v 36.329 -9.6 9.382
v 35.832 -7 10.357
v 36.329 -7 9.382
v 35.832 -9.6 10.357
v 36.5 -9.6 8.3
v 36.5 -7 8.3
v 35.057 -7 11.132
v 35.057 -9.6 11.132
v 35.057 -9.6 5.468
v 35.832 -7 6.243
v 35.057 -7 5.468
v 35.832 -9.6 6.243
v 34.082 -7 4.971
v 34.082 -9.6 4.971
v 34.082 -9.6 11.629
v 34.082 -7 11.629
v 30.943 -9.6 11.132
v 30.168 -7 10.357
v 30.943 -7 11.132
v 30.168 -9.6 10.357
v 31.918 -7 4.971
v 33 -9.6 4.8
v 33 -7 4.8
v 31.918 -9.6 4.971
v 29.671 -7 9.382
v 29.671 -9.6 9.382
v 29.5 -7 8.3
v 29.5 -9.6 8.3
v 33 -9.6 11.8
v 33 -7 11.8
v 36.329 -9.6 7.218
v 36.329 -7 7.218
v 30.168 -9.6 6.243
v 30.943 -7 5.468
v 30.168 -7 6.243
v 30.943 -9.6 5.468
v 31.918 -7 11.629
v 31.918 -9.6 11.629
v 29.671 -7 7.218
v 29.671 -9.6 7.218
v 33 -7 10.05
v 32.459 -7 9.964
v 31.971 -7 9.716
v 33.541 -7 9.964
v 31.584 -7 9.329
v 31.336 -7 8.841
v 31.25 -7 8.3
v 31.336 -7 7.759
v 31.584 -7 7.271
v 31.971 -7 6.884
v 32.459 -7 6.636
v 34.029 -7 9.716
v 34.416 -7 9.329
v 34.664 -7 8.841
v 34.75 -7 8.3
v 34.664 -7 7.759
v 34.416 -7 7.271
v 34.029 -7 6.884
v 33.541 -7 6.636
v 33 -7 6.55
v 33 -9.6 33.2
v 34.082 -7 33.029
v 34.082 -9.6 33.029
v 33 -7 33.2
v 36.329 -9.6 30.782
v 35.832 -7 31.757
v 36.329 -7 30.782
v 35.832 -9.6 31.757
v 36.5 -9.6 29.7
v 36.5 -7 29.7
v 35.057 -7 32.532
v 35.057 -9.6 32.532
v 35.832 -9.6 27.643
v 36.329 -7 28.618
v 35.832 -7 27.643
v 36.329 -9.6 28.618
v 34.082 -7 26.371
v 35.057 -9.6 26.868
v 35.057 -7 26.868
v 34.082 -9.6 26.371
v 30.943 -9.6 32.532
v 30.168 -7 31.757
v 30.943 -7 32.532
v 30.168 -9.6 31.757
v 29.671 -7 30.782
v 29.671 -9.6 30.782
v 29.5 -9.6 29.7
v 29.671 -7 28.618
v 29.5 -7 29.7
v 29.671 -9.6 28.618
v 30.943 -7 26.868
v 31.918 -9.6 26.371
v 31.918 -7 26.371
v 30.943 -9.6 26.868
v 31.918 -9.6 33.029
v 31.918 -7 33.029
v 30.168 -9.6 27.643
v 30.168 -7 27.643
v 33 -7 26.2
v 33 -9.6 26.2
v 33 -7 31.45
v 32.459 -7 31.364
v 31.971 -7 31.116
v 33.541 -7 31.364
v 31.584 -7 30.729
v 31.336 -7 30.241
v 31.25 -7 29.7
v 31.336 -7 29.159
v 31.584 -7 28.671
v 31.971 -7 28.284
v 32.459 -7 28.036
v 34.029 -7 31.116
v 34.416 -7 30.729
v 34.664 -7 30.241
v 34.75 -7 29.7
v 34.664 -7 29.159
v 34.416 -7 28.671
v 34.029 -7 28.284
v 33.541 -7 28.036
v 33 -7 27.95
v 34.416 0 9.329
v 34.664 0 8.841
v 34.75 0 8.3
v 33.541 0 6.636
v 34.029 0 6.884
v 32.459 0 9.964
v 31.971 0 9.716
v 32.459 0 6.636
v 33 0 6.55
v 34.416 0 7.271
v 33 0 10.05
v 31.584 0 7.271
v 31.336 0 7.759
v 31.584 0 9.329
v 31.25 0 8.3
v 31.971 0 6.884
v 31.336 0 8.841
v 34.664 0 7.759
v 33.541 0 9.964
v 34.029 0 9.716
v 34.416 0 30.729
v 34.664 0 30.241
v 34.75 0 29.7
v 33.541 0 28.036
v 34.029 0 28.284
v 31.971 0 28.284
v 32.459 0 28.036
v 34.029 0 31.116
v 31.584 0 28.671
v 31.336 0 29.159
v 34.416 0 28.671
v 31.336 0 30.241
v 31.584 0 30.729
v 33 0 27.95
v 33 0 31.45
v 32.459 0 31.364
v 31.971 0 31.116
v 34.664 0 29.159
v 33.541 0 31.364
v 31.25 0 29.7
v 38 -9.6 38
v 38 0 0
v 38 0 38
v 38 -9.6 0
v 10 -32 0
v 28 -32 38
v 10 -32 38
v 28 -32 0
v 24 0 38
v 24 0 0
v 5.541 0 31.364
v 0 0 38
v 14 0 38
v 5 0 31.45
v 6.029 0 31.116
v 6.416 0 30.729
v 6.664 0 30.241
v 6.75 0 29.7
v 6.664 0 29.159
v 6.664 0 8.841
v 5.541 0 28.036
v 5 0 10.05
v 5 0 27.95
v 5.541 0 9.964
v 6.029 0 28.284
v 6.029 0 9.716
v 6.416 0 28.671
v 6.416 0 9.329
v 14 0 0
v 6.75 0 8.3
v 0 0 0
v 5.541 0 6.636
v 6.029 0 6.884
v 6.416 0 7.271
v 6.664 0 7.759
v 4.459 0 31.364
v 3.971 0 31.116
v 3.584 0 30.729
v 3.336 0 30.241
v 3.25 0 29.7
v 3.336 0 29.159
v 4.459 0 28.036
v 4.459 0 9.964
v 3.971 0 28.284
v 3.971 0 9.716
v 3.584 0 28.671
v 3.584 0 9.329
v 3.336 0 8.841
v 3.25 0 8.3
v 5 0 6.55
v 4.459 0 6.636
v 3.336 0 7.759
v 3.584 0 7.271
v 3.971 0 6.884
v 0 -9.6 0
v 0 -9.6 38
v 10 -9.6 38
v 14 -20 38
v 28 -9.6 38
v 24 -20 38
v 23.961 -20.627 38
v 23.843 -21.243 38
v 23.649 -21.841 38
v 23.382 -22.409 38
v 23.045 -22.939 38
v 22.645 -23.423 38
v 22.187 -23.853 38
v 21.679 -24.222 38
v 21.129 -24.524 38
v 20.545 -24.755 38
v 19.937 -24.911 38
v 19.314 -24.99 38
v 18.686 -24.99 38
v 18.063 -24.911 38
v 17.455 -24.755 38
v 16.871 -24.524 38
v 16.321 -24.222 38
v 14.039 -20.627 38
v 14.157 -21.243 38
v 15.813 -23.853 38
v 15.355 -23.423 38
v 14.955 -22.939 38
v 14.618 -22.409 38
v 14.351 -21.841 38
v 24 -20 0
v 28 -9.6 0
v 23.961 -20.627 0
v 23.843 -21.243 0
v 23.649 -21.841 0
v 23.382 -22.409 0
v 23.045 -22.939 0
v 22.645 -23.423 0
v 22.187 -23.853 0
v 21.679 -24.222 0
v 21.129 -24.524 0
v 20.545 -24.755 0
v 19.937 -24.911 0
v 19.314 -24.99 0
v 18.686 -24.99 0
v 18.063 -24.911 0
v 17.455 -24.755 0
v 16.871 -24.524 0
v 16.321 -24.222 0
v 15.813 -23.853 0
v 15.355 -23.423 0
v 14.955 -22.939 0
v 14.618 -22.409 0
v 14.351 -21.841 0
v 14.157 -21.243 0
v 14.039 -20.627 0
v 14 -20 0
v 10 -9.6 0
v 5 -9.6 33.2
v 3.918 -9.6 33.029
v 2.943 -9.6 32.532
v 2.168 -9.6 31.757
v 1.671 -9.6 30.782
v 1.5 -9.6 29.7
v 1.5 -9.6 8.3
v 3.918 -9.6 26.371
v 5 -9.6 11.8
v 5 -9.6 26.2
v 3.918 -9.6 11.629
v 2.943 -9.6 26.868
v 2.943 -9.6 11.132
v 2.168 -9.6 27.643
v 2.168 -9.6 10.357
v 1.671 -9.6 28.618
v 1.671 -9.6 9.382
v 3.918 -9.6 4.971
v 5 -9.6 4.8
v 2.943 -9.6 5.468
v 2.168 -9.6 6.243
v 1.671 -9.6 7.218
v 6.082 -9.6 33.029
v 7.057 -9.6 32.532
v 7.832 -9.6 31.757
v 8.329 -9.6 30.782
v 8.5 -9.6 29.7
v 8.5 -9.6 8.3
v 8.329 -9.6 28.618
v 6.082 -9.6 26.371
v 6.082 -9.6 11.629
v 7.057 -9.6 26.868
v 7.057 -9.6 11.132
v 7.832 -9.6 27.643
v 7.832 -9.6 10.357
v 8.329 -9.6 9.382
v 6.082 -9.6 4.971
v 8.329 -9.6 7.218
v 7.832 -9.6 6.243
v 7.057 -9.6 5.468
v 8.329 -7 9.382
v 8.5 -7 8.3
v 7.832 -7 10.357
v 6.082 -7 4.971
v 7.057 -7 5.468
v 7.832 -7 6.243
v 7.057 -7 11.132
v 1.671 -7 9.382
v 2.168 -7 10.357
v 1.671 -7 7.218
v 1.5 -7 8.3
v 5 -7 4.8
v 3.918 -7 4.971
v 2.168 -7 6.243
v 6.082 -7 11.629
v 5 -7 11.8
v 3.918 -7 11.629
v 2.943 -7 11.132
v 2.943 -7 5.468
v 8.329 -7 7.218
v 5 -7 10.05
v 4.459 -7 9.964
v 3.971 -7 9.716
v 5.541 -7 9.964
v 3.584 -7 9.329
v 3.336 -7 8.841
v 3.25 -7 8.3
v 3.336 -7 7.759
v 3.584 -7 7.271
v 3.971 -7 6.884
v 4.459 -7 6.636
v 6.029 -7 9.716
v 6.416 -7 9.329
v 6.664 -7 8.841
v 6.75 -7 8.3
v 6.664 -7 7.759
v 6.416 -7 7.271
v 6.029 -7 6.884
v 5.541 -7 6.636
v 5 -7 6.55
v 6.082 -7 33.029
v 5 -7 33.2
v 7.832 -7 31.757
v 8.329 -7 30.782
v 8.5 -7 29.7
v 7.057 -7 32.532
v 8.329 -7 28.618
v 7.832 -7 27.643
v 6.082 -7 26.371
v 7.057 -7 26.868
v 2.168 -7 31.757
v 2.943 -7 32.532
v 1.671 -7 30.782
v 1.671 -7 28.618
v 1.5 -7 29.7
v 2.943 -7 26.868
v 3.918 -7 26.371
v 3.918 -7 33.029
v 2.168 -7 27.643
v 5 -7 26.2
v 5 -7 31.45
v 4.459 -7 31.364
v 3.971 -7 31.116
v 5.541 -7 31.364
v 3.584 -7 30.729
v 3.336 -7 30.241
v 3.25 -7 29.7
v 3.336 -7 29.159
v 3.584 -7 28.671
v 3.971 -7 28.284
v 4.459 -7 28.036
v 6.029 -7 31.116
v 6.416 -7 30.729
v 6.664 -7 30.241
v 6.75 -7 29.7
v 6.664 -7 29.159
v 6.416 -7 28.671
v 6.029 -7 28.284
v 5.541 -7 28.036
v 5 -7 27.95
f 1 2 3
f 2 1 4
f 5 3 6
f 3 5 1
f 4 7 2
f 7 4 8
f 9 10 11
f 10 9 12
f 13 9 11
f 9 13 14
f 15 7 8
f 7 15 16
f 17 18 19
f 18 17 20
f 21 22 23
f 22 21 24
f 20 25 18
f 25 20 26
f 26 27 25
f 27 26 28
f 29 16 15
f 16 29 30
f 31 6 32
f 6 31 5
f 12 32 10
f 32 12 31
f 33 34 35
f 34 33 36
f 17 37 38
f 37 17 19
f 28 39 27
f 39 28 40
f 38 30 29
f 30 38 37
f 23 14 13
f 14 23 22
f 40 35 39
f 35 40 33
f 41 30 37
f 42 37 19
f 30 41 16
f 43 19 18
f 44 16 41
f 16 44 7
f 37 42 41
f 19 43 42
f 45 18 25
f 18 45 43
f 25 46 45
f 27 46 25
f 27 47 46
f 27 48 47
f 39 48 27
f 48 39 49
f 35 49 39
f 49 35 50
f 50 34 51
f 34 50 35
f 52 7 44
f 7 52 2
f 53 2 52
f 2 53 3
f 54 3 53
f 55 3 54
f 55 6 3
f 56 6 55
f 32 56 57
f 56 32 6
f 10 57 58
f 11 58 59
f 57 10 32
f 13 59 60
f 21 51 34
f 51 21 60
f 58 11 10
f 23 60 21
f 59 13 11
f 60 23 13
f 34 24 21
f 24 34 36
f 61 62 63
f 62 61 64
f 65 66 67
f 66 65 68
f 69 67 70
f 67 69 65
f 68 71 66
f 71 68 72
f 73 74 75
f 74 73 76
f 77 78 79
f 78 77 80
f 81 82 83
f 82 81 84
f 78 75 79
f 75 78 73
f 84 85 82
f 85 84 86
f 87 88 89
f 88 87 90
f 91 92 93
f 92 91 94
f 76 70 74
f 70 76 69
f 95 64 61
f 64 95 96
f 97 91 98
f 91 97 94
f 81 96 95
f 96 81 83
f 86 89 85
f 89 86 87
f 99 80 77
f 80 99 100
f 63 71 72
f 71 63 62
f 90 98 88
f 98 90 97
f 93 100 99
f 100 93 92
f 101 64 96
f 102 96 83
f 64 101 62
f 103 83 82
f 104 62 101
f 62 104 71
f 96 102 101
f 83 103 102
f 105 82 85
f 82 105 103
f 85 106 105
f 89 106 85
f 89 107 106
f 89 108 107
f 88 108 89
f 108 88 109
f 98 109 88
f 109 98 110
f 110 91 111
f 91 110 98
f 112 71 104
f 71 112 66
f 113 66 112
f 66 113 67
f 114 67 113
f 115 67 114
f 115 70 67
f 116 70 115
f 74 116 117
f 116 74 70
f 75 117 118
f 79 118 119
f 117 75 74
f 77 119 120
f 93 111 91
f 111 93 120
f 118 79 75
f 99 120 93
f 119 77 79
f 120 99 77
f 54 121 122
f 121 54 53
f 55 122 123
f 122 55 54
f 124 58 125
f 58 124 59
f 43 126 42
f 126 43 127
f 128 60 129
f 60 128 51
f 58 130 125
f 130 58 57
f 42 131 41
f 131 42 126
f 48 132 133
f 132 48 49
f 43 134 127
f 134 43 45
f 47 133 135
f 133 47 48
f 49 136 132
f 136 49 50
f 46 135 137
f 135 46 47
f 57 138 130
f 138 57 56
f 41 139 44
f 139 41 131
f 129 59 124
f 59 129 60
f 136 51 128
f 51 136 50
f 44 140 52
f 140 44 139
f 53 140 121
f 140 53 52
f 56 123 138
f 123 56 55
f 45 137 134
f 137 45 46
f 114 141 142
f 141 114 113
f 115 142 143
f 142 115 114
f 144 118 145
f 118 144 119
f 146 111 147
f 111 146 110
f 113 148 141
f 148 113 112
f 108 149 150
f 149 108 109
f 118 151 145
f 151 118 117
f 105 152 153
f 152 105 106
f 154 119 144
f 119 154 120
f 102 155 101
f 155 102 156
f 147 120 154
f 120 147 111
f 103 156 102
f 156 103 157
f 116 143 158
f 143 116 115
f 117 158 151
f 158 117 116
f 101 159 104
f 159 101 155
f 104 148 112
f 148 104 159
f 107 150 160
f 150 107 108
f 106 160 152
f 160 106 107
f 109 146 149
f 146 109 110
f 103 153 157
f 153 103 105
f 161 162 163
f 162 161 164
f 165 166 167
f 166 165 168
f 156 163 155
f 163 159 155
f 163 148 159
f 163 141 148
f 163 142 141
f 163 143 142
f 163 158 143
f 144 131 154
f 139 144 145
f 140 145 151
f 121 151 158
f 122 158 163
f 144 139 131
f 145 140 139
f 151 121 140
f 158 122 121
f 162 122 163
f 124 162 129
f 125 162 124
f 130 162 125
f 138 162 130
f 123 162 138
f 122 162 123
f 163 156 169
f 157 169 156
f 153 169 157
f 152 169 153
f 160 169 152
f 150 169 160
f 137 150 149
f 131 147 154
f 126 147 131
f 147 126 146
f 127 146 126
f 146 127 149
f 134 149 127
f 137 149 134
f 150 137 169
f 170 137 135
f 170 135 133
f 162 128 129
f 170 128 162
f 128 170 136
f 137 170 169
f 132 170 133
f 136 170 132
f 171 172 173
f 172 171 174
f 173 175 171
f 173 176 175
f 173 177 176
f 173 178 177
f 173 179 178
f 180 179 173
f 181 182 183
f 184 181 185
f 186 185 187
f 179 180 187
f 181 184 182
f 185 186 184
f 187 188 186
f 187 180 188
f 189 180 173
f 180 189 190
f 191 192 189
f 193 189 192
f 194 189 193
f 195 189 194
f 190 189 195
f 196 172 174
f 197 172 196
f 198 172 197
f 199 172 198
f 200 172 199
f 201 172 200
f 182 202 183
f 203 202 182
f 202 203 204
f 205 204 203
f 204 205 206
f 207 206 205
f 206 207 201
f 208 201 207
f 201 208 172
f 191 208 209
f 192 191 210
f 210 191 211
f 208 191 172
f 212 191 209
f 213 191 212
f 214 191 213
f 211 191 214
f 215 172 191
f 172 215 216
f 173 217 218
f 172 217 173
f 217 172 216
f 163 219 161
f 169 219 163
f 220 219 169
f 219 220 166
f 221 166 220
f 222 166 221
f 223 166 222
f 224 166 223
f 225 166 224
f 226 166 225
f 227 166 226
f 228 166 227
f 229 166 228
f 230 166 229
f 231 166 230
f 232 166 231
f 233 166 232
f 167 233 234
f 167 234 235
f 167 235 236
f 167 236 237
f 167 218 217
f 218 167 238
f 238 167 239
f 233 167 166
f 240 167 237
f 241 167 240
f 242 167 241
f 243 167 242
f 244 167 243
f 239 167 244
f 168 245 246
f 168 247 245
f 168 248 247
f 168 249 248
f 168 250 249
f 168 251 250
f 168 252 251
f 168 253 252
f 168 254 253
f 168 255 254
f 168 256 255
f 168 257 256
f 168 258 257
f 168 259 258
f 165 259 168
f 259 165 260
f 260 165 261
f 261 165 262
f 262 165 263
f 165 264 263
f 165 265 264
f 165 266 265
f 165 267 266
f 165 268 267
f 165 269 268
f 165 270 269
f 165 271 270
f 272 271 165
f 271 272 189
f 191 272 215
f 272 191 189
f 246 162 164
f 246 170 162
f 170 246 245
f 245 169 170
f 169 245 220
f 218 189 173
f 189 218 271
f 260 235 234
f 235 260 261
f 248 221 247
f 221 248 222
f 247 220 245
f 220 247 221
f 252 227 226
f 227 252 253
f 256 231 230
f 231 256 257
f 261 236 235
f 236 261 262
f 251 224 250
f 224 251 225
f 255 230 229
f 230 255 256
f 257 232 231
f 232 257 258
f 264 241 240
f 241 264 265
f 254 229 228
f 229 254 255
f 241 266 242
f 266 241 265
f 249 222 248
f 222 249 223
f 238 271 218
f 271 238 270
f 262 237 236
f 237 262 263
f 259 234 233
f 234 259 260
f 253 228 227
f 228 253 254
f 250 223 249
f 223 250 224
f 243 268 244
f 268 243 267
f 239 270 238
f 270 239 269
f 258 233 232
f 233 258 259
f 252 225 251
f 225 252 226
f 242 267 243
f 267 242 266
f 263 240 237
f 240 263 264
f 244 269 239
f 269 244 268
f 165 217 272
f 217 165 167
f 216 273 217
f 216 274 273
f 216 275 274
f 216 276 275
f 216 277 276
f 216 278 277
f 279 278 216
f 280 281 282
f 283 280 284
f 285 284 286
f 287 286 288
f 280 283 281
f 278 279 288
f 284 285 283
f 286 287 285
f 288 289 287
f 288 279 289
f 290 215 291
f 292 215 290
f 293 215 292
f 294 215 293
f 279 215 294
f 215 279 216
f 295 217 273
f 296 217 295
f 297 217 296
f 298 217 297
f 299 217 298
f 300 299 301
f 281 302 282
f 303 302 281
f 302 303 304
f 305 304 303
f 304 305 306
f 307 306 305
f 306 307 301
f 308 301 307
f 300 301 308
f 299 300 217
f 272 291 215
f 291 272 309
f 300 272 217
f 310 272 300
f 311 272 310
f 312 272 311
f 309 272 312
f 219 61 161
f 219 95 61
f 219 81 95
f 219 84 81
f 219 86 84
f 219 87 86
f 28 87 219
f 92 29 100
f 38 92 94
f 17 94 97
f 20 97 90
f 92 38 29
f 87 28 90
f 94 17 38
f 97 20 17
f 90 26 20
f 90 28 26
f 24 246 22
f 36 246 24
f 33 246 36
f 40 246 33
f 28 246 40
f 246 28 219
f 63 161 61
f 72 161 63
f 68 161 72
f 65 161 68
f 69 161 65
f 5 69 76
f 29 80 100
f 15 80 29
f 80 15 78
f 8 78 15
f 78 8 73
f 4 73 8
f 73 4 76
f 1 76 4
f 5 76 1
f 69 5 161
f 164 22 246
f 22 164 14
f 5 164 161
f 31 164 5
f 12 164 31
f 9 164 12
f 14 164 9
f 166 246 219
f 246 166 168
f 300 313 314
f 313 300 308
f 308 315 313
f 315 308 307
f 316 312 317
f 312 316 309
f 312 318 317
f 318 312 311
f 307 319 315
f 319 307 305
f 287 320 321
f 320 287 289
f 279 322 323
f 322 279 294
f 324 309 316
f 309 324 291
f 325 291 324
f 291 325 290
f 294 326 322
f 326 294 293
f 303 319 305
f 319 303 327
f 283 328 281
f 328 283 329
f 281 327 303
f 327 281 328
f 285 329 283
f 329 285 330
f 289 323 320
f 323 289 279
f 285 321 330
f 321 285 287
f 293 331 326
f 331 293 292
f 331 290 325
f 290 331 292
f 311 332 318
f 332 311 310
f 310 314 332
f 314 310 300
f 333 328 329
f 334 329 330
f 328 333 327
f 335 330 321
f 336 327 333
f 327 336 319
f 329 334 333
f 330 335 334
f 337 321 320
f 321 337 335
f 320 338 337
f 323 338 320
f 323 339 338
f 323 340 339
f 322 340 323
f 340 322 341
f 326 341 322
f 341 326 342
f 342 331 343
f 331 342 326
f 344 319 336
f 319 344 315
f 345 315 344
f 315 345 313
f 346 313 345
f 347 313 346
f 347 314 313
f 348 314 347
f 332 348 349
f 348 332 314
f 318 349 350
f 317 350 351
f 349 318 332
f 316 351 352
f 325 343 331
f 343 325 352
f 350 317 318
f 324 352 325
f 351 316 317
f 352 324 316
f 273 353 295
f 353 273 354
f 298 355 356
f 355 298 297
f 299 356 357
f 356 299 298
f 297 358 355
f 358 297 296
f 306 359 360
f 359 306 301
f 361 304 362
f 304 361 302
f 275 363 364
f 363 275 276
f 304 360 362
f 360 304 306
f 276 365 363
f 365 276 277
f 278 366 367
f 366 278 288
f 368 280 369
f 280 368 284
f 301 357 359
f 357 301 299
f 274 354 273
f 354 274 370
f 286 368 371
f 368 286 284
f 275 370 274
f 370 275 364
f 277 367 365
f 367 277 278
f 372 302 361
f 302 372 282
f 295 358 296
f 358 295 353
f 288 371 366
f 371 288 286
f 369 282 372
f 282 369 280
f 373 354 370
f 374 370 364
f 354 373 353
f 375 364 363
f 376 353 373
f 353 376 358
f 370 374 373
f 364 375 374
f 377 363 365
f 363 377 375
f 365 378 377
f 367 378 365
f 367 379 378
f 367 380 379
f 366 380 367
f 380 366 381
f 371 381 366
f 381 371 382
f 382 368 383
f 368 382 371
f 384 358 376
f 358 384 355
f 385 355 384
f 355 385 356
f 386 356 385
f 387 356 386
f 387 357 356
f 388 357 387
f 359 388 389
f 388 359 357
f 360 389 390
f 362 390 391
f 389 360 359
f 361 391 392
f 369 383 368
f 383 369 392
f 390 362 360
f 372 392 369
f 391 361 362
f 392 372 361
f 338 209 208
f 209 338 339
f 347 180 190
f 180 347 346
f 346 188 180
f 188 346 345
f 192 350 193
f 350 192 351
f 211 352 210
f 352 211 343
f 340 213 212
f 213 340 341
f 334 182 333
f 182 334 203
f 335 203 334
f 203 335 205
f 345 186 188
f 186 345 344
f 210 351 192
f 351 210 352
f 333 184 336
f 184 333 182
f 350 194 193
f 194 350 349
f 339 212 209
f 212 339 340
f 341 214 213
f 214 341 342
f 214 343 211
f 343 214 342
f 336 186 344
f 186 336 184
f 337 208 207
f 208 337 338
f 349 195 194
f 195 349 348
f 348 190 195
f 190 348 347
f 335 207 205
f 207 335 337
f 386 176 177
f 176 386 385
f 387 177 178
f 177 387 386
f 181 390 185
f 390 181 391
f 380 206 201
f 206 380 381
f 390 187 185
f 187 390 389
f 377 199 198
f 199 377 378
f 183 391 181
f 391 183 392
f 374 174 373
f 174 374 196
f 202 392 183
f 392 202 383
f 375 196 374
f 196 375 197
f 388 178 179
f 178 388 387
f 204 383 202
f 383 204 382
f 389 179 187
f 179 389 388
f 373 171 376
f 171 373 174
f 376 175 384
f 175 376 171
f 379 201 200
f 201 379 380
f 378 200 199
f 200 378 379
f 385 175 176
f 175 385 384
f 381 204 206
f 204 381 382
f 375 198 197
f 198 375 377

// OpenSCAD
rotate([90, 0, 0]){
	difference(){ 
		cube([38, 38, 32]);

		// Out cut
		translate([14, -1, -1]) cube([10, 40, 21]);
		translate([19, 39, 20]) rotate([90, 0, 0]) cylinder(h = 40, d = 10, $fn = 50);
		translate([-1, -1, 9.6]) cube([11, 40, 35]);
		translate([28, -1, 9.6]) cube([11, 40, 35]);

		// Screw holes
		translate([5, 8.3, 7]) cylinder(h = 3, d = 7, $fn = 20);
		translate([5, 29.7, 7]) cylinder(h = 3, d = 7, $fn = 20);
		translate([5, 8.3, -1]) cylinder(h = 20, d = 3.5, $fn = 20);
		translate([5, 29.7, -1]) cylinder(h = 20, d = 3.5, $fn = 20);

		translate([28, 0, 0]){
			translate([5, 8.3, 7]) cylinder(h = 3, d = 7, $fn = 20);
			translate([5, 29.7, 7]) cylinder(h = 3, d = 7, $fn = 20);
			translate([5, 8.3, -1]) cylinder(h = 20, d = 3.5, $fn = 20);
			translate([5, 29.7, -1]) cylinder(h = 20, d = 3.5, $fn = 20);
		}
	}
}
